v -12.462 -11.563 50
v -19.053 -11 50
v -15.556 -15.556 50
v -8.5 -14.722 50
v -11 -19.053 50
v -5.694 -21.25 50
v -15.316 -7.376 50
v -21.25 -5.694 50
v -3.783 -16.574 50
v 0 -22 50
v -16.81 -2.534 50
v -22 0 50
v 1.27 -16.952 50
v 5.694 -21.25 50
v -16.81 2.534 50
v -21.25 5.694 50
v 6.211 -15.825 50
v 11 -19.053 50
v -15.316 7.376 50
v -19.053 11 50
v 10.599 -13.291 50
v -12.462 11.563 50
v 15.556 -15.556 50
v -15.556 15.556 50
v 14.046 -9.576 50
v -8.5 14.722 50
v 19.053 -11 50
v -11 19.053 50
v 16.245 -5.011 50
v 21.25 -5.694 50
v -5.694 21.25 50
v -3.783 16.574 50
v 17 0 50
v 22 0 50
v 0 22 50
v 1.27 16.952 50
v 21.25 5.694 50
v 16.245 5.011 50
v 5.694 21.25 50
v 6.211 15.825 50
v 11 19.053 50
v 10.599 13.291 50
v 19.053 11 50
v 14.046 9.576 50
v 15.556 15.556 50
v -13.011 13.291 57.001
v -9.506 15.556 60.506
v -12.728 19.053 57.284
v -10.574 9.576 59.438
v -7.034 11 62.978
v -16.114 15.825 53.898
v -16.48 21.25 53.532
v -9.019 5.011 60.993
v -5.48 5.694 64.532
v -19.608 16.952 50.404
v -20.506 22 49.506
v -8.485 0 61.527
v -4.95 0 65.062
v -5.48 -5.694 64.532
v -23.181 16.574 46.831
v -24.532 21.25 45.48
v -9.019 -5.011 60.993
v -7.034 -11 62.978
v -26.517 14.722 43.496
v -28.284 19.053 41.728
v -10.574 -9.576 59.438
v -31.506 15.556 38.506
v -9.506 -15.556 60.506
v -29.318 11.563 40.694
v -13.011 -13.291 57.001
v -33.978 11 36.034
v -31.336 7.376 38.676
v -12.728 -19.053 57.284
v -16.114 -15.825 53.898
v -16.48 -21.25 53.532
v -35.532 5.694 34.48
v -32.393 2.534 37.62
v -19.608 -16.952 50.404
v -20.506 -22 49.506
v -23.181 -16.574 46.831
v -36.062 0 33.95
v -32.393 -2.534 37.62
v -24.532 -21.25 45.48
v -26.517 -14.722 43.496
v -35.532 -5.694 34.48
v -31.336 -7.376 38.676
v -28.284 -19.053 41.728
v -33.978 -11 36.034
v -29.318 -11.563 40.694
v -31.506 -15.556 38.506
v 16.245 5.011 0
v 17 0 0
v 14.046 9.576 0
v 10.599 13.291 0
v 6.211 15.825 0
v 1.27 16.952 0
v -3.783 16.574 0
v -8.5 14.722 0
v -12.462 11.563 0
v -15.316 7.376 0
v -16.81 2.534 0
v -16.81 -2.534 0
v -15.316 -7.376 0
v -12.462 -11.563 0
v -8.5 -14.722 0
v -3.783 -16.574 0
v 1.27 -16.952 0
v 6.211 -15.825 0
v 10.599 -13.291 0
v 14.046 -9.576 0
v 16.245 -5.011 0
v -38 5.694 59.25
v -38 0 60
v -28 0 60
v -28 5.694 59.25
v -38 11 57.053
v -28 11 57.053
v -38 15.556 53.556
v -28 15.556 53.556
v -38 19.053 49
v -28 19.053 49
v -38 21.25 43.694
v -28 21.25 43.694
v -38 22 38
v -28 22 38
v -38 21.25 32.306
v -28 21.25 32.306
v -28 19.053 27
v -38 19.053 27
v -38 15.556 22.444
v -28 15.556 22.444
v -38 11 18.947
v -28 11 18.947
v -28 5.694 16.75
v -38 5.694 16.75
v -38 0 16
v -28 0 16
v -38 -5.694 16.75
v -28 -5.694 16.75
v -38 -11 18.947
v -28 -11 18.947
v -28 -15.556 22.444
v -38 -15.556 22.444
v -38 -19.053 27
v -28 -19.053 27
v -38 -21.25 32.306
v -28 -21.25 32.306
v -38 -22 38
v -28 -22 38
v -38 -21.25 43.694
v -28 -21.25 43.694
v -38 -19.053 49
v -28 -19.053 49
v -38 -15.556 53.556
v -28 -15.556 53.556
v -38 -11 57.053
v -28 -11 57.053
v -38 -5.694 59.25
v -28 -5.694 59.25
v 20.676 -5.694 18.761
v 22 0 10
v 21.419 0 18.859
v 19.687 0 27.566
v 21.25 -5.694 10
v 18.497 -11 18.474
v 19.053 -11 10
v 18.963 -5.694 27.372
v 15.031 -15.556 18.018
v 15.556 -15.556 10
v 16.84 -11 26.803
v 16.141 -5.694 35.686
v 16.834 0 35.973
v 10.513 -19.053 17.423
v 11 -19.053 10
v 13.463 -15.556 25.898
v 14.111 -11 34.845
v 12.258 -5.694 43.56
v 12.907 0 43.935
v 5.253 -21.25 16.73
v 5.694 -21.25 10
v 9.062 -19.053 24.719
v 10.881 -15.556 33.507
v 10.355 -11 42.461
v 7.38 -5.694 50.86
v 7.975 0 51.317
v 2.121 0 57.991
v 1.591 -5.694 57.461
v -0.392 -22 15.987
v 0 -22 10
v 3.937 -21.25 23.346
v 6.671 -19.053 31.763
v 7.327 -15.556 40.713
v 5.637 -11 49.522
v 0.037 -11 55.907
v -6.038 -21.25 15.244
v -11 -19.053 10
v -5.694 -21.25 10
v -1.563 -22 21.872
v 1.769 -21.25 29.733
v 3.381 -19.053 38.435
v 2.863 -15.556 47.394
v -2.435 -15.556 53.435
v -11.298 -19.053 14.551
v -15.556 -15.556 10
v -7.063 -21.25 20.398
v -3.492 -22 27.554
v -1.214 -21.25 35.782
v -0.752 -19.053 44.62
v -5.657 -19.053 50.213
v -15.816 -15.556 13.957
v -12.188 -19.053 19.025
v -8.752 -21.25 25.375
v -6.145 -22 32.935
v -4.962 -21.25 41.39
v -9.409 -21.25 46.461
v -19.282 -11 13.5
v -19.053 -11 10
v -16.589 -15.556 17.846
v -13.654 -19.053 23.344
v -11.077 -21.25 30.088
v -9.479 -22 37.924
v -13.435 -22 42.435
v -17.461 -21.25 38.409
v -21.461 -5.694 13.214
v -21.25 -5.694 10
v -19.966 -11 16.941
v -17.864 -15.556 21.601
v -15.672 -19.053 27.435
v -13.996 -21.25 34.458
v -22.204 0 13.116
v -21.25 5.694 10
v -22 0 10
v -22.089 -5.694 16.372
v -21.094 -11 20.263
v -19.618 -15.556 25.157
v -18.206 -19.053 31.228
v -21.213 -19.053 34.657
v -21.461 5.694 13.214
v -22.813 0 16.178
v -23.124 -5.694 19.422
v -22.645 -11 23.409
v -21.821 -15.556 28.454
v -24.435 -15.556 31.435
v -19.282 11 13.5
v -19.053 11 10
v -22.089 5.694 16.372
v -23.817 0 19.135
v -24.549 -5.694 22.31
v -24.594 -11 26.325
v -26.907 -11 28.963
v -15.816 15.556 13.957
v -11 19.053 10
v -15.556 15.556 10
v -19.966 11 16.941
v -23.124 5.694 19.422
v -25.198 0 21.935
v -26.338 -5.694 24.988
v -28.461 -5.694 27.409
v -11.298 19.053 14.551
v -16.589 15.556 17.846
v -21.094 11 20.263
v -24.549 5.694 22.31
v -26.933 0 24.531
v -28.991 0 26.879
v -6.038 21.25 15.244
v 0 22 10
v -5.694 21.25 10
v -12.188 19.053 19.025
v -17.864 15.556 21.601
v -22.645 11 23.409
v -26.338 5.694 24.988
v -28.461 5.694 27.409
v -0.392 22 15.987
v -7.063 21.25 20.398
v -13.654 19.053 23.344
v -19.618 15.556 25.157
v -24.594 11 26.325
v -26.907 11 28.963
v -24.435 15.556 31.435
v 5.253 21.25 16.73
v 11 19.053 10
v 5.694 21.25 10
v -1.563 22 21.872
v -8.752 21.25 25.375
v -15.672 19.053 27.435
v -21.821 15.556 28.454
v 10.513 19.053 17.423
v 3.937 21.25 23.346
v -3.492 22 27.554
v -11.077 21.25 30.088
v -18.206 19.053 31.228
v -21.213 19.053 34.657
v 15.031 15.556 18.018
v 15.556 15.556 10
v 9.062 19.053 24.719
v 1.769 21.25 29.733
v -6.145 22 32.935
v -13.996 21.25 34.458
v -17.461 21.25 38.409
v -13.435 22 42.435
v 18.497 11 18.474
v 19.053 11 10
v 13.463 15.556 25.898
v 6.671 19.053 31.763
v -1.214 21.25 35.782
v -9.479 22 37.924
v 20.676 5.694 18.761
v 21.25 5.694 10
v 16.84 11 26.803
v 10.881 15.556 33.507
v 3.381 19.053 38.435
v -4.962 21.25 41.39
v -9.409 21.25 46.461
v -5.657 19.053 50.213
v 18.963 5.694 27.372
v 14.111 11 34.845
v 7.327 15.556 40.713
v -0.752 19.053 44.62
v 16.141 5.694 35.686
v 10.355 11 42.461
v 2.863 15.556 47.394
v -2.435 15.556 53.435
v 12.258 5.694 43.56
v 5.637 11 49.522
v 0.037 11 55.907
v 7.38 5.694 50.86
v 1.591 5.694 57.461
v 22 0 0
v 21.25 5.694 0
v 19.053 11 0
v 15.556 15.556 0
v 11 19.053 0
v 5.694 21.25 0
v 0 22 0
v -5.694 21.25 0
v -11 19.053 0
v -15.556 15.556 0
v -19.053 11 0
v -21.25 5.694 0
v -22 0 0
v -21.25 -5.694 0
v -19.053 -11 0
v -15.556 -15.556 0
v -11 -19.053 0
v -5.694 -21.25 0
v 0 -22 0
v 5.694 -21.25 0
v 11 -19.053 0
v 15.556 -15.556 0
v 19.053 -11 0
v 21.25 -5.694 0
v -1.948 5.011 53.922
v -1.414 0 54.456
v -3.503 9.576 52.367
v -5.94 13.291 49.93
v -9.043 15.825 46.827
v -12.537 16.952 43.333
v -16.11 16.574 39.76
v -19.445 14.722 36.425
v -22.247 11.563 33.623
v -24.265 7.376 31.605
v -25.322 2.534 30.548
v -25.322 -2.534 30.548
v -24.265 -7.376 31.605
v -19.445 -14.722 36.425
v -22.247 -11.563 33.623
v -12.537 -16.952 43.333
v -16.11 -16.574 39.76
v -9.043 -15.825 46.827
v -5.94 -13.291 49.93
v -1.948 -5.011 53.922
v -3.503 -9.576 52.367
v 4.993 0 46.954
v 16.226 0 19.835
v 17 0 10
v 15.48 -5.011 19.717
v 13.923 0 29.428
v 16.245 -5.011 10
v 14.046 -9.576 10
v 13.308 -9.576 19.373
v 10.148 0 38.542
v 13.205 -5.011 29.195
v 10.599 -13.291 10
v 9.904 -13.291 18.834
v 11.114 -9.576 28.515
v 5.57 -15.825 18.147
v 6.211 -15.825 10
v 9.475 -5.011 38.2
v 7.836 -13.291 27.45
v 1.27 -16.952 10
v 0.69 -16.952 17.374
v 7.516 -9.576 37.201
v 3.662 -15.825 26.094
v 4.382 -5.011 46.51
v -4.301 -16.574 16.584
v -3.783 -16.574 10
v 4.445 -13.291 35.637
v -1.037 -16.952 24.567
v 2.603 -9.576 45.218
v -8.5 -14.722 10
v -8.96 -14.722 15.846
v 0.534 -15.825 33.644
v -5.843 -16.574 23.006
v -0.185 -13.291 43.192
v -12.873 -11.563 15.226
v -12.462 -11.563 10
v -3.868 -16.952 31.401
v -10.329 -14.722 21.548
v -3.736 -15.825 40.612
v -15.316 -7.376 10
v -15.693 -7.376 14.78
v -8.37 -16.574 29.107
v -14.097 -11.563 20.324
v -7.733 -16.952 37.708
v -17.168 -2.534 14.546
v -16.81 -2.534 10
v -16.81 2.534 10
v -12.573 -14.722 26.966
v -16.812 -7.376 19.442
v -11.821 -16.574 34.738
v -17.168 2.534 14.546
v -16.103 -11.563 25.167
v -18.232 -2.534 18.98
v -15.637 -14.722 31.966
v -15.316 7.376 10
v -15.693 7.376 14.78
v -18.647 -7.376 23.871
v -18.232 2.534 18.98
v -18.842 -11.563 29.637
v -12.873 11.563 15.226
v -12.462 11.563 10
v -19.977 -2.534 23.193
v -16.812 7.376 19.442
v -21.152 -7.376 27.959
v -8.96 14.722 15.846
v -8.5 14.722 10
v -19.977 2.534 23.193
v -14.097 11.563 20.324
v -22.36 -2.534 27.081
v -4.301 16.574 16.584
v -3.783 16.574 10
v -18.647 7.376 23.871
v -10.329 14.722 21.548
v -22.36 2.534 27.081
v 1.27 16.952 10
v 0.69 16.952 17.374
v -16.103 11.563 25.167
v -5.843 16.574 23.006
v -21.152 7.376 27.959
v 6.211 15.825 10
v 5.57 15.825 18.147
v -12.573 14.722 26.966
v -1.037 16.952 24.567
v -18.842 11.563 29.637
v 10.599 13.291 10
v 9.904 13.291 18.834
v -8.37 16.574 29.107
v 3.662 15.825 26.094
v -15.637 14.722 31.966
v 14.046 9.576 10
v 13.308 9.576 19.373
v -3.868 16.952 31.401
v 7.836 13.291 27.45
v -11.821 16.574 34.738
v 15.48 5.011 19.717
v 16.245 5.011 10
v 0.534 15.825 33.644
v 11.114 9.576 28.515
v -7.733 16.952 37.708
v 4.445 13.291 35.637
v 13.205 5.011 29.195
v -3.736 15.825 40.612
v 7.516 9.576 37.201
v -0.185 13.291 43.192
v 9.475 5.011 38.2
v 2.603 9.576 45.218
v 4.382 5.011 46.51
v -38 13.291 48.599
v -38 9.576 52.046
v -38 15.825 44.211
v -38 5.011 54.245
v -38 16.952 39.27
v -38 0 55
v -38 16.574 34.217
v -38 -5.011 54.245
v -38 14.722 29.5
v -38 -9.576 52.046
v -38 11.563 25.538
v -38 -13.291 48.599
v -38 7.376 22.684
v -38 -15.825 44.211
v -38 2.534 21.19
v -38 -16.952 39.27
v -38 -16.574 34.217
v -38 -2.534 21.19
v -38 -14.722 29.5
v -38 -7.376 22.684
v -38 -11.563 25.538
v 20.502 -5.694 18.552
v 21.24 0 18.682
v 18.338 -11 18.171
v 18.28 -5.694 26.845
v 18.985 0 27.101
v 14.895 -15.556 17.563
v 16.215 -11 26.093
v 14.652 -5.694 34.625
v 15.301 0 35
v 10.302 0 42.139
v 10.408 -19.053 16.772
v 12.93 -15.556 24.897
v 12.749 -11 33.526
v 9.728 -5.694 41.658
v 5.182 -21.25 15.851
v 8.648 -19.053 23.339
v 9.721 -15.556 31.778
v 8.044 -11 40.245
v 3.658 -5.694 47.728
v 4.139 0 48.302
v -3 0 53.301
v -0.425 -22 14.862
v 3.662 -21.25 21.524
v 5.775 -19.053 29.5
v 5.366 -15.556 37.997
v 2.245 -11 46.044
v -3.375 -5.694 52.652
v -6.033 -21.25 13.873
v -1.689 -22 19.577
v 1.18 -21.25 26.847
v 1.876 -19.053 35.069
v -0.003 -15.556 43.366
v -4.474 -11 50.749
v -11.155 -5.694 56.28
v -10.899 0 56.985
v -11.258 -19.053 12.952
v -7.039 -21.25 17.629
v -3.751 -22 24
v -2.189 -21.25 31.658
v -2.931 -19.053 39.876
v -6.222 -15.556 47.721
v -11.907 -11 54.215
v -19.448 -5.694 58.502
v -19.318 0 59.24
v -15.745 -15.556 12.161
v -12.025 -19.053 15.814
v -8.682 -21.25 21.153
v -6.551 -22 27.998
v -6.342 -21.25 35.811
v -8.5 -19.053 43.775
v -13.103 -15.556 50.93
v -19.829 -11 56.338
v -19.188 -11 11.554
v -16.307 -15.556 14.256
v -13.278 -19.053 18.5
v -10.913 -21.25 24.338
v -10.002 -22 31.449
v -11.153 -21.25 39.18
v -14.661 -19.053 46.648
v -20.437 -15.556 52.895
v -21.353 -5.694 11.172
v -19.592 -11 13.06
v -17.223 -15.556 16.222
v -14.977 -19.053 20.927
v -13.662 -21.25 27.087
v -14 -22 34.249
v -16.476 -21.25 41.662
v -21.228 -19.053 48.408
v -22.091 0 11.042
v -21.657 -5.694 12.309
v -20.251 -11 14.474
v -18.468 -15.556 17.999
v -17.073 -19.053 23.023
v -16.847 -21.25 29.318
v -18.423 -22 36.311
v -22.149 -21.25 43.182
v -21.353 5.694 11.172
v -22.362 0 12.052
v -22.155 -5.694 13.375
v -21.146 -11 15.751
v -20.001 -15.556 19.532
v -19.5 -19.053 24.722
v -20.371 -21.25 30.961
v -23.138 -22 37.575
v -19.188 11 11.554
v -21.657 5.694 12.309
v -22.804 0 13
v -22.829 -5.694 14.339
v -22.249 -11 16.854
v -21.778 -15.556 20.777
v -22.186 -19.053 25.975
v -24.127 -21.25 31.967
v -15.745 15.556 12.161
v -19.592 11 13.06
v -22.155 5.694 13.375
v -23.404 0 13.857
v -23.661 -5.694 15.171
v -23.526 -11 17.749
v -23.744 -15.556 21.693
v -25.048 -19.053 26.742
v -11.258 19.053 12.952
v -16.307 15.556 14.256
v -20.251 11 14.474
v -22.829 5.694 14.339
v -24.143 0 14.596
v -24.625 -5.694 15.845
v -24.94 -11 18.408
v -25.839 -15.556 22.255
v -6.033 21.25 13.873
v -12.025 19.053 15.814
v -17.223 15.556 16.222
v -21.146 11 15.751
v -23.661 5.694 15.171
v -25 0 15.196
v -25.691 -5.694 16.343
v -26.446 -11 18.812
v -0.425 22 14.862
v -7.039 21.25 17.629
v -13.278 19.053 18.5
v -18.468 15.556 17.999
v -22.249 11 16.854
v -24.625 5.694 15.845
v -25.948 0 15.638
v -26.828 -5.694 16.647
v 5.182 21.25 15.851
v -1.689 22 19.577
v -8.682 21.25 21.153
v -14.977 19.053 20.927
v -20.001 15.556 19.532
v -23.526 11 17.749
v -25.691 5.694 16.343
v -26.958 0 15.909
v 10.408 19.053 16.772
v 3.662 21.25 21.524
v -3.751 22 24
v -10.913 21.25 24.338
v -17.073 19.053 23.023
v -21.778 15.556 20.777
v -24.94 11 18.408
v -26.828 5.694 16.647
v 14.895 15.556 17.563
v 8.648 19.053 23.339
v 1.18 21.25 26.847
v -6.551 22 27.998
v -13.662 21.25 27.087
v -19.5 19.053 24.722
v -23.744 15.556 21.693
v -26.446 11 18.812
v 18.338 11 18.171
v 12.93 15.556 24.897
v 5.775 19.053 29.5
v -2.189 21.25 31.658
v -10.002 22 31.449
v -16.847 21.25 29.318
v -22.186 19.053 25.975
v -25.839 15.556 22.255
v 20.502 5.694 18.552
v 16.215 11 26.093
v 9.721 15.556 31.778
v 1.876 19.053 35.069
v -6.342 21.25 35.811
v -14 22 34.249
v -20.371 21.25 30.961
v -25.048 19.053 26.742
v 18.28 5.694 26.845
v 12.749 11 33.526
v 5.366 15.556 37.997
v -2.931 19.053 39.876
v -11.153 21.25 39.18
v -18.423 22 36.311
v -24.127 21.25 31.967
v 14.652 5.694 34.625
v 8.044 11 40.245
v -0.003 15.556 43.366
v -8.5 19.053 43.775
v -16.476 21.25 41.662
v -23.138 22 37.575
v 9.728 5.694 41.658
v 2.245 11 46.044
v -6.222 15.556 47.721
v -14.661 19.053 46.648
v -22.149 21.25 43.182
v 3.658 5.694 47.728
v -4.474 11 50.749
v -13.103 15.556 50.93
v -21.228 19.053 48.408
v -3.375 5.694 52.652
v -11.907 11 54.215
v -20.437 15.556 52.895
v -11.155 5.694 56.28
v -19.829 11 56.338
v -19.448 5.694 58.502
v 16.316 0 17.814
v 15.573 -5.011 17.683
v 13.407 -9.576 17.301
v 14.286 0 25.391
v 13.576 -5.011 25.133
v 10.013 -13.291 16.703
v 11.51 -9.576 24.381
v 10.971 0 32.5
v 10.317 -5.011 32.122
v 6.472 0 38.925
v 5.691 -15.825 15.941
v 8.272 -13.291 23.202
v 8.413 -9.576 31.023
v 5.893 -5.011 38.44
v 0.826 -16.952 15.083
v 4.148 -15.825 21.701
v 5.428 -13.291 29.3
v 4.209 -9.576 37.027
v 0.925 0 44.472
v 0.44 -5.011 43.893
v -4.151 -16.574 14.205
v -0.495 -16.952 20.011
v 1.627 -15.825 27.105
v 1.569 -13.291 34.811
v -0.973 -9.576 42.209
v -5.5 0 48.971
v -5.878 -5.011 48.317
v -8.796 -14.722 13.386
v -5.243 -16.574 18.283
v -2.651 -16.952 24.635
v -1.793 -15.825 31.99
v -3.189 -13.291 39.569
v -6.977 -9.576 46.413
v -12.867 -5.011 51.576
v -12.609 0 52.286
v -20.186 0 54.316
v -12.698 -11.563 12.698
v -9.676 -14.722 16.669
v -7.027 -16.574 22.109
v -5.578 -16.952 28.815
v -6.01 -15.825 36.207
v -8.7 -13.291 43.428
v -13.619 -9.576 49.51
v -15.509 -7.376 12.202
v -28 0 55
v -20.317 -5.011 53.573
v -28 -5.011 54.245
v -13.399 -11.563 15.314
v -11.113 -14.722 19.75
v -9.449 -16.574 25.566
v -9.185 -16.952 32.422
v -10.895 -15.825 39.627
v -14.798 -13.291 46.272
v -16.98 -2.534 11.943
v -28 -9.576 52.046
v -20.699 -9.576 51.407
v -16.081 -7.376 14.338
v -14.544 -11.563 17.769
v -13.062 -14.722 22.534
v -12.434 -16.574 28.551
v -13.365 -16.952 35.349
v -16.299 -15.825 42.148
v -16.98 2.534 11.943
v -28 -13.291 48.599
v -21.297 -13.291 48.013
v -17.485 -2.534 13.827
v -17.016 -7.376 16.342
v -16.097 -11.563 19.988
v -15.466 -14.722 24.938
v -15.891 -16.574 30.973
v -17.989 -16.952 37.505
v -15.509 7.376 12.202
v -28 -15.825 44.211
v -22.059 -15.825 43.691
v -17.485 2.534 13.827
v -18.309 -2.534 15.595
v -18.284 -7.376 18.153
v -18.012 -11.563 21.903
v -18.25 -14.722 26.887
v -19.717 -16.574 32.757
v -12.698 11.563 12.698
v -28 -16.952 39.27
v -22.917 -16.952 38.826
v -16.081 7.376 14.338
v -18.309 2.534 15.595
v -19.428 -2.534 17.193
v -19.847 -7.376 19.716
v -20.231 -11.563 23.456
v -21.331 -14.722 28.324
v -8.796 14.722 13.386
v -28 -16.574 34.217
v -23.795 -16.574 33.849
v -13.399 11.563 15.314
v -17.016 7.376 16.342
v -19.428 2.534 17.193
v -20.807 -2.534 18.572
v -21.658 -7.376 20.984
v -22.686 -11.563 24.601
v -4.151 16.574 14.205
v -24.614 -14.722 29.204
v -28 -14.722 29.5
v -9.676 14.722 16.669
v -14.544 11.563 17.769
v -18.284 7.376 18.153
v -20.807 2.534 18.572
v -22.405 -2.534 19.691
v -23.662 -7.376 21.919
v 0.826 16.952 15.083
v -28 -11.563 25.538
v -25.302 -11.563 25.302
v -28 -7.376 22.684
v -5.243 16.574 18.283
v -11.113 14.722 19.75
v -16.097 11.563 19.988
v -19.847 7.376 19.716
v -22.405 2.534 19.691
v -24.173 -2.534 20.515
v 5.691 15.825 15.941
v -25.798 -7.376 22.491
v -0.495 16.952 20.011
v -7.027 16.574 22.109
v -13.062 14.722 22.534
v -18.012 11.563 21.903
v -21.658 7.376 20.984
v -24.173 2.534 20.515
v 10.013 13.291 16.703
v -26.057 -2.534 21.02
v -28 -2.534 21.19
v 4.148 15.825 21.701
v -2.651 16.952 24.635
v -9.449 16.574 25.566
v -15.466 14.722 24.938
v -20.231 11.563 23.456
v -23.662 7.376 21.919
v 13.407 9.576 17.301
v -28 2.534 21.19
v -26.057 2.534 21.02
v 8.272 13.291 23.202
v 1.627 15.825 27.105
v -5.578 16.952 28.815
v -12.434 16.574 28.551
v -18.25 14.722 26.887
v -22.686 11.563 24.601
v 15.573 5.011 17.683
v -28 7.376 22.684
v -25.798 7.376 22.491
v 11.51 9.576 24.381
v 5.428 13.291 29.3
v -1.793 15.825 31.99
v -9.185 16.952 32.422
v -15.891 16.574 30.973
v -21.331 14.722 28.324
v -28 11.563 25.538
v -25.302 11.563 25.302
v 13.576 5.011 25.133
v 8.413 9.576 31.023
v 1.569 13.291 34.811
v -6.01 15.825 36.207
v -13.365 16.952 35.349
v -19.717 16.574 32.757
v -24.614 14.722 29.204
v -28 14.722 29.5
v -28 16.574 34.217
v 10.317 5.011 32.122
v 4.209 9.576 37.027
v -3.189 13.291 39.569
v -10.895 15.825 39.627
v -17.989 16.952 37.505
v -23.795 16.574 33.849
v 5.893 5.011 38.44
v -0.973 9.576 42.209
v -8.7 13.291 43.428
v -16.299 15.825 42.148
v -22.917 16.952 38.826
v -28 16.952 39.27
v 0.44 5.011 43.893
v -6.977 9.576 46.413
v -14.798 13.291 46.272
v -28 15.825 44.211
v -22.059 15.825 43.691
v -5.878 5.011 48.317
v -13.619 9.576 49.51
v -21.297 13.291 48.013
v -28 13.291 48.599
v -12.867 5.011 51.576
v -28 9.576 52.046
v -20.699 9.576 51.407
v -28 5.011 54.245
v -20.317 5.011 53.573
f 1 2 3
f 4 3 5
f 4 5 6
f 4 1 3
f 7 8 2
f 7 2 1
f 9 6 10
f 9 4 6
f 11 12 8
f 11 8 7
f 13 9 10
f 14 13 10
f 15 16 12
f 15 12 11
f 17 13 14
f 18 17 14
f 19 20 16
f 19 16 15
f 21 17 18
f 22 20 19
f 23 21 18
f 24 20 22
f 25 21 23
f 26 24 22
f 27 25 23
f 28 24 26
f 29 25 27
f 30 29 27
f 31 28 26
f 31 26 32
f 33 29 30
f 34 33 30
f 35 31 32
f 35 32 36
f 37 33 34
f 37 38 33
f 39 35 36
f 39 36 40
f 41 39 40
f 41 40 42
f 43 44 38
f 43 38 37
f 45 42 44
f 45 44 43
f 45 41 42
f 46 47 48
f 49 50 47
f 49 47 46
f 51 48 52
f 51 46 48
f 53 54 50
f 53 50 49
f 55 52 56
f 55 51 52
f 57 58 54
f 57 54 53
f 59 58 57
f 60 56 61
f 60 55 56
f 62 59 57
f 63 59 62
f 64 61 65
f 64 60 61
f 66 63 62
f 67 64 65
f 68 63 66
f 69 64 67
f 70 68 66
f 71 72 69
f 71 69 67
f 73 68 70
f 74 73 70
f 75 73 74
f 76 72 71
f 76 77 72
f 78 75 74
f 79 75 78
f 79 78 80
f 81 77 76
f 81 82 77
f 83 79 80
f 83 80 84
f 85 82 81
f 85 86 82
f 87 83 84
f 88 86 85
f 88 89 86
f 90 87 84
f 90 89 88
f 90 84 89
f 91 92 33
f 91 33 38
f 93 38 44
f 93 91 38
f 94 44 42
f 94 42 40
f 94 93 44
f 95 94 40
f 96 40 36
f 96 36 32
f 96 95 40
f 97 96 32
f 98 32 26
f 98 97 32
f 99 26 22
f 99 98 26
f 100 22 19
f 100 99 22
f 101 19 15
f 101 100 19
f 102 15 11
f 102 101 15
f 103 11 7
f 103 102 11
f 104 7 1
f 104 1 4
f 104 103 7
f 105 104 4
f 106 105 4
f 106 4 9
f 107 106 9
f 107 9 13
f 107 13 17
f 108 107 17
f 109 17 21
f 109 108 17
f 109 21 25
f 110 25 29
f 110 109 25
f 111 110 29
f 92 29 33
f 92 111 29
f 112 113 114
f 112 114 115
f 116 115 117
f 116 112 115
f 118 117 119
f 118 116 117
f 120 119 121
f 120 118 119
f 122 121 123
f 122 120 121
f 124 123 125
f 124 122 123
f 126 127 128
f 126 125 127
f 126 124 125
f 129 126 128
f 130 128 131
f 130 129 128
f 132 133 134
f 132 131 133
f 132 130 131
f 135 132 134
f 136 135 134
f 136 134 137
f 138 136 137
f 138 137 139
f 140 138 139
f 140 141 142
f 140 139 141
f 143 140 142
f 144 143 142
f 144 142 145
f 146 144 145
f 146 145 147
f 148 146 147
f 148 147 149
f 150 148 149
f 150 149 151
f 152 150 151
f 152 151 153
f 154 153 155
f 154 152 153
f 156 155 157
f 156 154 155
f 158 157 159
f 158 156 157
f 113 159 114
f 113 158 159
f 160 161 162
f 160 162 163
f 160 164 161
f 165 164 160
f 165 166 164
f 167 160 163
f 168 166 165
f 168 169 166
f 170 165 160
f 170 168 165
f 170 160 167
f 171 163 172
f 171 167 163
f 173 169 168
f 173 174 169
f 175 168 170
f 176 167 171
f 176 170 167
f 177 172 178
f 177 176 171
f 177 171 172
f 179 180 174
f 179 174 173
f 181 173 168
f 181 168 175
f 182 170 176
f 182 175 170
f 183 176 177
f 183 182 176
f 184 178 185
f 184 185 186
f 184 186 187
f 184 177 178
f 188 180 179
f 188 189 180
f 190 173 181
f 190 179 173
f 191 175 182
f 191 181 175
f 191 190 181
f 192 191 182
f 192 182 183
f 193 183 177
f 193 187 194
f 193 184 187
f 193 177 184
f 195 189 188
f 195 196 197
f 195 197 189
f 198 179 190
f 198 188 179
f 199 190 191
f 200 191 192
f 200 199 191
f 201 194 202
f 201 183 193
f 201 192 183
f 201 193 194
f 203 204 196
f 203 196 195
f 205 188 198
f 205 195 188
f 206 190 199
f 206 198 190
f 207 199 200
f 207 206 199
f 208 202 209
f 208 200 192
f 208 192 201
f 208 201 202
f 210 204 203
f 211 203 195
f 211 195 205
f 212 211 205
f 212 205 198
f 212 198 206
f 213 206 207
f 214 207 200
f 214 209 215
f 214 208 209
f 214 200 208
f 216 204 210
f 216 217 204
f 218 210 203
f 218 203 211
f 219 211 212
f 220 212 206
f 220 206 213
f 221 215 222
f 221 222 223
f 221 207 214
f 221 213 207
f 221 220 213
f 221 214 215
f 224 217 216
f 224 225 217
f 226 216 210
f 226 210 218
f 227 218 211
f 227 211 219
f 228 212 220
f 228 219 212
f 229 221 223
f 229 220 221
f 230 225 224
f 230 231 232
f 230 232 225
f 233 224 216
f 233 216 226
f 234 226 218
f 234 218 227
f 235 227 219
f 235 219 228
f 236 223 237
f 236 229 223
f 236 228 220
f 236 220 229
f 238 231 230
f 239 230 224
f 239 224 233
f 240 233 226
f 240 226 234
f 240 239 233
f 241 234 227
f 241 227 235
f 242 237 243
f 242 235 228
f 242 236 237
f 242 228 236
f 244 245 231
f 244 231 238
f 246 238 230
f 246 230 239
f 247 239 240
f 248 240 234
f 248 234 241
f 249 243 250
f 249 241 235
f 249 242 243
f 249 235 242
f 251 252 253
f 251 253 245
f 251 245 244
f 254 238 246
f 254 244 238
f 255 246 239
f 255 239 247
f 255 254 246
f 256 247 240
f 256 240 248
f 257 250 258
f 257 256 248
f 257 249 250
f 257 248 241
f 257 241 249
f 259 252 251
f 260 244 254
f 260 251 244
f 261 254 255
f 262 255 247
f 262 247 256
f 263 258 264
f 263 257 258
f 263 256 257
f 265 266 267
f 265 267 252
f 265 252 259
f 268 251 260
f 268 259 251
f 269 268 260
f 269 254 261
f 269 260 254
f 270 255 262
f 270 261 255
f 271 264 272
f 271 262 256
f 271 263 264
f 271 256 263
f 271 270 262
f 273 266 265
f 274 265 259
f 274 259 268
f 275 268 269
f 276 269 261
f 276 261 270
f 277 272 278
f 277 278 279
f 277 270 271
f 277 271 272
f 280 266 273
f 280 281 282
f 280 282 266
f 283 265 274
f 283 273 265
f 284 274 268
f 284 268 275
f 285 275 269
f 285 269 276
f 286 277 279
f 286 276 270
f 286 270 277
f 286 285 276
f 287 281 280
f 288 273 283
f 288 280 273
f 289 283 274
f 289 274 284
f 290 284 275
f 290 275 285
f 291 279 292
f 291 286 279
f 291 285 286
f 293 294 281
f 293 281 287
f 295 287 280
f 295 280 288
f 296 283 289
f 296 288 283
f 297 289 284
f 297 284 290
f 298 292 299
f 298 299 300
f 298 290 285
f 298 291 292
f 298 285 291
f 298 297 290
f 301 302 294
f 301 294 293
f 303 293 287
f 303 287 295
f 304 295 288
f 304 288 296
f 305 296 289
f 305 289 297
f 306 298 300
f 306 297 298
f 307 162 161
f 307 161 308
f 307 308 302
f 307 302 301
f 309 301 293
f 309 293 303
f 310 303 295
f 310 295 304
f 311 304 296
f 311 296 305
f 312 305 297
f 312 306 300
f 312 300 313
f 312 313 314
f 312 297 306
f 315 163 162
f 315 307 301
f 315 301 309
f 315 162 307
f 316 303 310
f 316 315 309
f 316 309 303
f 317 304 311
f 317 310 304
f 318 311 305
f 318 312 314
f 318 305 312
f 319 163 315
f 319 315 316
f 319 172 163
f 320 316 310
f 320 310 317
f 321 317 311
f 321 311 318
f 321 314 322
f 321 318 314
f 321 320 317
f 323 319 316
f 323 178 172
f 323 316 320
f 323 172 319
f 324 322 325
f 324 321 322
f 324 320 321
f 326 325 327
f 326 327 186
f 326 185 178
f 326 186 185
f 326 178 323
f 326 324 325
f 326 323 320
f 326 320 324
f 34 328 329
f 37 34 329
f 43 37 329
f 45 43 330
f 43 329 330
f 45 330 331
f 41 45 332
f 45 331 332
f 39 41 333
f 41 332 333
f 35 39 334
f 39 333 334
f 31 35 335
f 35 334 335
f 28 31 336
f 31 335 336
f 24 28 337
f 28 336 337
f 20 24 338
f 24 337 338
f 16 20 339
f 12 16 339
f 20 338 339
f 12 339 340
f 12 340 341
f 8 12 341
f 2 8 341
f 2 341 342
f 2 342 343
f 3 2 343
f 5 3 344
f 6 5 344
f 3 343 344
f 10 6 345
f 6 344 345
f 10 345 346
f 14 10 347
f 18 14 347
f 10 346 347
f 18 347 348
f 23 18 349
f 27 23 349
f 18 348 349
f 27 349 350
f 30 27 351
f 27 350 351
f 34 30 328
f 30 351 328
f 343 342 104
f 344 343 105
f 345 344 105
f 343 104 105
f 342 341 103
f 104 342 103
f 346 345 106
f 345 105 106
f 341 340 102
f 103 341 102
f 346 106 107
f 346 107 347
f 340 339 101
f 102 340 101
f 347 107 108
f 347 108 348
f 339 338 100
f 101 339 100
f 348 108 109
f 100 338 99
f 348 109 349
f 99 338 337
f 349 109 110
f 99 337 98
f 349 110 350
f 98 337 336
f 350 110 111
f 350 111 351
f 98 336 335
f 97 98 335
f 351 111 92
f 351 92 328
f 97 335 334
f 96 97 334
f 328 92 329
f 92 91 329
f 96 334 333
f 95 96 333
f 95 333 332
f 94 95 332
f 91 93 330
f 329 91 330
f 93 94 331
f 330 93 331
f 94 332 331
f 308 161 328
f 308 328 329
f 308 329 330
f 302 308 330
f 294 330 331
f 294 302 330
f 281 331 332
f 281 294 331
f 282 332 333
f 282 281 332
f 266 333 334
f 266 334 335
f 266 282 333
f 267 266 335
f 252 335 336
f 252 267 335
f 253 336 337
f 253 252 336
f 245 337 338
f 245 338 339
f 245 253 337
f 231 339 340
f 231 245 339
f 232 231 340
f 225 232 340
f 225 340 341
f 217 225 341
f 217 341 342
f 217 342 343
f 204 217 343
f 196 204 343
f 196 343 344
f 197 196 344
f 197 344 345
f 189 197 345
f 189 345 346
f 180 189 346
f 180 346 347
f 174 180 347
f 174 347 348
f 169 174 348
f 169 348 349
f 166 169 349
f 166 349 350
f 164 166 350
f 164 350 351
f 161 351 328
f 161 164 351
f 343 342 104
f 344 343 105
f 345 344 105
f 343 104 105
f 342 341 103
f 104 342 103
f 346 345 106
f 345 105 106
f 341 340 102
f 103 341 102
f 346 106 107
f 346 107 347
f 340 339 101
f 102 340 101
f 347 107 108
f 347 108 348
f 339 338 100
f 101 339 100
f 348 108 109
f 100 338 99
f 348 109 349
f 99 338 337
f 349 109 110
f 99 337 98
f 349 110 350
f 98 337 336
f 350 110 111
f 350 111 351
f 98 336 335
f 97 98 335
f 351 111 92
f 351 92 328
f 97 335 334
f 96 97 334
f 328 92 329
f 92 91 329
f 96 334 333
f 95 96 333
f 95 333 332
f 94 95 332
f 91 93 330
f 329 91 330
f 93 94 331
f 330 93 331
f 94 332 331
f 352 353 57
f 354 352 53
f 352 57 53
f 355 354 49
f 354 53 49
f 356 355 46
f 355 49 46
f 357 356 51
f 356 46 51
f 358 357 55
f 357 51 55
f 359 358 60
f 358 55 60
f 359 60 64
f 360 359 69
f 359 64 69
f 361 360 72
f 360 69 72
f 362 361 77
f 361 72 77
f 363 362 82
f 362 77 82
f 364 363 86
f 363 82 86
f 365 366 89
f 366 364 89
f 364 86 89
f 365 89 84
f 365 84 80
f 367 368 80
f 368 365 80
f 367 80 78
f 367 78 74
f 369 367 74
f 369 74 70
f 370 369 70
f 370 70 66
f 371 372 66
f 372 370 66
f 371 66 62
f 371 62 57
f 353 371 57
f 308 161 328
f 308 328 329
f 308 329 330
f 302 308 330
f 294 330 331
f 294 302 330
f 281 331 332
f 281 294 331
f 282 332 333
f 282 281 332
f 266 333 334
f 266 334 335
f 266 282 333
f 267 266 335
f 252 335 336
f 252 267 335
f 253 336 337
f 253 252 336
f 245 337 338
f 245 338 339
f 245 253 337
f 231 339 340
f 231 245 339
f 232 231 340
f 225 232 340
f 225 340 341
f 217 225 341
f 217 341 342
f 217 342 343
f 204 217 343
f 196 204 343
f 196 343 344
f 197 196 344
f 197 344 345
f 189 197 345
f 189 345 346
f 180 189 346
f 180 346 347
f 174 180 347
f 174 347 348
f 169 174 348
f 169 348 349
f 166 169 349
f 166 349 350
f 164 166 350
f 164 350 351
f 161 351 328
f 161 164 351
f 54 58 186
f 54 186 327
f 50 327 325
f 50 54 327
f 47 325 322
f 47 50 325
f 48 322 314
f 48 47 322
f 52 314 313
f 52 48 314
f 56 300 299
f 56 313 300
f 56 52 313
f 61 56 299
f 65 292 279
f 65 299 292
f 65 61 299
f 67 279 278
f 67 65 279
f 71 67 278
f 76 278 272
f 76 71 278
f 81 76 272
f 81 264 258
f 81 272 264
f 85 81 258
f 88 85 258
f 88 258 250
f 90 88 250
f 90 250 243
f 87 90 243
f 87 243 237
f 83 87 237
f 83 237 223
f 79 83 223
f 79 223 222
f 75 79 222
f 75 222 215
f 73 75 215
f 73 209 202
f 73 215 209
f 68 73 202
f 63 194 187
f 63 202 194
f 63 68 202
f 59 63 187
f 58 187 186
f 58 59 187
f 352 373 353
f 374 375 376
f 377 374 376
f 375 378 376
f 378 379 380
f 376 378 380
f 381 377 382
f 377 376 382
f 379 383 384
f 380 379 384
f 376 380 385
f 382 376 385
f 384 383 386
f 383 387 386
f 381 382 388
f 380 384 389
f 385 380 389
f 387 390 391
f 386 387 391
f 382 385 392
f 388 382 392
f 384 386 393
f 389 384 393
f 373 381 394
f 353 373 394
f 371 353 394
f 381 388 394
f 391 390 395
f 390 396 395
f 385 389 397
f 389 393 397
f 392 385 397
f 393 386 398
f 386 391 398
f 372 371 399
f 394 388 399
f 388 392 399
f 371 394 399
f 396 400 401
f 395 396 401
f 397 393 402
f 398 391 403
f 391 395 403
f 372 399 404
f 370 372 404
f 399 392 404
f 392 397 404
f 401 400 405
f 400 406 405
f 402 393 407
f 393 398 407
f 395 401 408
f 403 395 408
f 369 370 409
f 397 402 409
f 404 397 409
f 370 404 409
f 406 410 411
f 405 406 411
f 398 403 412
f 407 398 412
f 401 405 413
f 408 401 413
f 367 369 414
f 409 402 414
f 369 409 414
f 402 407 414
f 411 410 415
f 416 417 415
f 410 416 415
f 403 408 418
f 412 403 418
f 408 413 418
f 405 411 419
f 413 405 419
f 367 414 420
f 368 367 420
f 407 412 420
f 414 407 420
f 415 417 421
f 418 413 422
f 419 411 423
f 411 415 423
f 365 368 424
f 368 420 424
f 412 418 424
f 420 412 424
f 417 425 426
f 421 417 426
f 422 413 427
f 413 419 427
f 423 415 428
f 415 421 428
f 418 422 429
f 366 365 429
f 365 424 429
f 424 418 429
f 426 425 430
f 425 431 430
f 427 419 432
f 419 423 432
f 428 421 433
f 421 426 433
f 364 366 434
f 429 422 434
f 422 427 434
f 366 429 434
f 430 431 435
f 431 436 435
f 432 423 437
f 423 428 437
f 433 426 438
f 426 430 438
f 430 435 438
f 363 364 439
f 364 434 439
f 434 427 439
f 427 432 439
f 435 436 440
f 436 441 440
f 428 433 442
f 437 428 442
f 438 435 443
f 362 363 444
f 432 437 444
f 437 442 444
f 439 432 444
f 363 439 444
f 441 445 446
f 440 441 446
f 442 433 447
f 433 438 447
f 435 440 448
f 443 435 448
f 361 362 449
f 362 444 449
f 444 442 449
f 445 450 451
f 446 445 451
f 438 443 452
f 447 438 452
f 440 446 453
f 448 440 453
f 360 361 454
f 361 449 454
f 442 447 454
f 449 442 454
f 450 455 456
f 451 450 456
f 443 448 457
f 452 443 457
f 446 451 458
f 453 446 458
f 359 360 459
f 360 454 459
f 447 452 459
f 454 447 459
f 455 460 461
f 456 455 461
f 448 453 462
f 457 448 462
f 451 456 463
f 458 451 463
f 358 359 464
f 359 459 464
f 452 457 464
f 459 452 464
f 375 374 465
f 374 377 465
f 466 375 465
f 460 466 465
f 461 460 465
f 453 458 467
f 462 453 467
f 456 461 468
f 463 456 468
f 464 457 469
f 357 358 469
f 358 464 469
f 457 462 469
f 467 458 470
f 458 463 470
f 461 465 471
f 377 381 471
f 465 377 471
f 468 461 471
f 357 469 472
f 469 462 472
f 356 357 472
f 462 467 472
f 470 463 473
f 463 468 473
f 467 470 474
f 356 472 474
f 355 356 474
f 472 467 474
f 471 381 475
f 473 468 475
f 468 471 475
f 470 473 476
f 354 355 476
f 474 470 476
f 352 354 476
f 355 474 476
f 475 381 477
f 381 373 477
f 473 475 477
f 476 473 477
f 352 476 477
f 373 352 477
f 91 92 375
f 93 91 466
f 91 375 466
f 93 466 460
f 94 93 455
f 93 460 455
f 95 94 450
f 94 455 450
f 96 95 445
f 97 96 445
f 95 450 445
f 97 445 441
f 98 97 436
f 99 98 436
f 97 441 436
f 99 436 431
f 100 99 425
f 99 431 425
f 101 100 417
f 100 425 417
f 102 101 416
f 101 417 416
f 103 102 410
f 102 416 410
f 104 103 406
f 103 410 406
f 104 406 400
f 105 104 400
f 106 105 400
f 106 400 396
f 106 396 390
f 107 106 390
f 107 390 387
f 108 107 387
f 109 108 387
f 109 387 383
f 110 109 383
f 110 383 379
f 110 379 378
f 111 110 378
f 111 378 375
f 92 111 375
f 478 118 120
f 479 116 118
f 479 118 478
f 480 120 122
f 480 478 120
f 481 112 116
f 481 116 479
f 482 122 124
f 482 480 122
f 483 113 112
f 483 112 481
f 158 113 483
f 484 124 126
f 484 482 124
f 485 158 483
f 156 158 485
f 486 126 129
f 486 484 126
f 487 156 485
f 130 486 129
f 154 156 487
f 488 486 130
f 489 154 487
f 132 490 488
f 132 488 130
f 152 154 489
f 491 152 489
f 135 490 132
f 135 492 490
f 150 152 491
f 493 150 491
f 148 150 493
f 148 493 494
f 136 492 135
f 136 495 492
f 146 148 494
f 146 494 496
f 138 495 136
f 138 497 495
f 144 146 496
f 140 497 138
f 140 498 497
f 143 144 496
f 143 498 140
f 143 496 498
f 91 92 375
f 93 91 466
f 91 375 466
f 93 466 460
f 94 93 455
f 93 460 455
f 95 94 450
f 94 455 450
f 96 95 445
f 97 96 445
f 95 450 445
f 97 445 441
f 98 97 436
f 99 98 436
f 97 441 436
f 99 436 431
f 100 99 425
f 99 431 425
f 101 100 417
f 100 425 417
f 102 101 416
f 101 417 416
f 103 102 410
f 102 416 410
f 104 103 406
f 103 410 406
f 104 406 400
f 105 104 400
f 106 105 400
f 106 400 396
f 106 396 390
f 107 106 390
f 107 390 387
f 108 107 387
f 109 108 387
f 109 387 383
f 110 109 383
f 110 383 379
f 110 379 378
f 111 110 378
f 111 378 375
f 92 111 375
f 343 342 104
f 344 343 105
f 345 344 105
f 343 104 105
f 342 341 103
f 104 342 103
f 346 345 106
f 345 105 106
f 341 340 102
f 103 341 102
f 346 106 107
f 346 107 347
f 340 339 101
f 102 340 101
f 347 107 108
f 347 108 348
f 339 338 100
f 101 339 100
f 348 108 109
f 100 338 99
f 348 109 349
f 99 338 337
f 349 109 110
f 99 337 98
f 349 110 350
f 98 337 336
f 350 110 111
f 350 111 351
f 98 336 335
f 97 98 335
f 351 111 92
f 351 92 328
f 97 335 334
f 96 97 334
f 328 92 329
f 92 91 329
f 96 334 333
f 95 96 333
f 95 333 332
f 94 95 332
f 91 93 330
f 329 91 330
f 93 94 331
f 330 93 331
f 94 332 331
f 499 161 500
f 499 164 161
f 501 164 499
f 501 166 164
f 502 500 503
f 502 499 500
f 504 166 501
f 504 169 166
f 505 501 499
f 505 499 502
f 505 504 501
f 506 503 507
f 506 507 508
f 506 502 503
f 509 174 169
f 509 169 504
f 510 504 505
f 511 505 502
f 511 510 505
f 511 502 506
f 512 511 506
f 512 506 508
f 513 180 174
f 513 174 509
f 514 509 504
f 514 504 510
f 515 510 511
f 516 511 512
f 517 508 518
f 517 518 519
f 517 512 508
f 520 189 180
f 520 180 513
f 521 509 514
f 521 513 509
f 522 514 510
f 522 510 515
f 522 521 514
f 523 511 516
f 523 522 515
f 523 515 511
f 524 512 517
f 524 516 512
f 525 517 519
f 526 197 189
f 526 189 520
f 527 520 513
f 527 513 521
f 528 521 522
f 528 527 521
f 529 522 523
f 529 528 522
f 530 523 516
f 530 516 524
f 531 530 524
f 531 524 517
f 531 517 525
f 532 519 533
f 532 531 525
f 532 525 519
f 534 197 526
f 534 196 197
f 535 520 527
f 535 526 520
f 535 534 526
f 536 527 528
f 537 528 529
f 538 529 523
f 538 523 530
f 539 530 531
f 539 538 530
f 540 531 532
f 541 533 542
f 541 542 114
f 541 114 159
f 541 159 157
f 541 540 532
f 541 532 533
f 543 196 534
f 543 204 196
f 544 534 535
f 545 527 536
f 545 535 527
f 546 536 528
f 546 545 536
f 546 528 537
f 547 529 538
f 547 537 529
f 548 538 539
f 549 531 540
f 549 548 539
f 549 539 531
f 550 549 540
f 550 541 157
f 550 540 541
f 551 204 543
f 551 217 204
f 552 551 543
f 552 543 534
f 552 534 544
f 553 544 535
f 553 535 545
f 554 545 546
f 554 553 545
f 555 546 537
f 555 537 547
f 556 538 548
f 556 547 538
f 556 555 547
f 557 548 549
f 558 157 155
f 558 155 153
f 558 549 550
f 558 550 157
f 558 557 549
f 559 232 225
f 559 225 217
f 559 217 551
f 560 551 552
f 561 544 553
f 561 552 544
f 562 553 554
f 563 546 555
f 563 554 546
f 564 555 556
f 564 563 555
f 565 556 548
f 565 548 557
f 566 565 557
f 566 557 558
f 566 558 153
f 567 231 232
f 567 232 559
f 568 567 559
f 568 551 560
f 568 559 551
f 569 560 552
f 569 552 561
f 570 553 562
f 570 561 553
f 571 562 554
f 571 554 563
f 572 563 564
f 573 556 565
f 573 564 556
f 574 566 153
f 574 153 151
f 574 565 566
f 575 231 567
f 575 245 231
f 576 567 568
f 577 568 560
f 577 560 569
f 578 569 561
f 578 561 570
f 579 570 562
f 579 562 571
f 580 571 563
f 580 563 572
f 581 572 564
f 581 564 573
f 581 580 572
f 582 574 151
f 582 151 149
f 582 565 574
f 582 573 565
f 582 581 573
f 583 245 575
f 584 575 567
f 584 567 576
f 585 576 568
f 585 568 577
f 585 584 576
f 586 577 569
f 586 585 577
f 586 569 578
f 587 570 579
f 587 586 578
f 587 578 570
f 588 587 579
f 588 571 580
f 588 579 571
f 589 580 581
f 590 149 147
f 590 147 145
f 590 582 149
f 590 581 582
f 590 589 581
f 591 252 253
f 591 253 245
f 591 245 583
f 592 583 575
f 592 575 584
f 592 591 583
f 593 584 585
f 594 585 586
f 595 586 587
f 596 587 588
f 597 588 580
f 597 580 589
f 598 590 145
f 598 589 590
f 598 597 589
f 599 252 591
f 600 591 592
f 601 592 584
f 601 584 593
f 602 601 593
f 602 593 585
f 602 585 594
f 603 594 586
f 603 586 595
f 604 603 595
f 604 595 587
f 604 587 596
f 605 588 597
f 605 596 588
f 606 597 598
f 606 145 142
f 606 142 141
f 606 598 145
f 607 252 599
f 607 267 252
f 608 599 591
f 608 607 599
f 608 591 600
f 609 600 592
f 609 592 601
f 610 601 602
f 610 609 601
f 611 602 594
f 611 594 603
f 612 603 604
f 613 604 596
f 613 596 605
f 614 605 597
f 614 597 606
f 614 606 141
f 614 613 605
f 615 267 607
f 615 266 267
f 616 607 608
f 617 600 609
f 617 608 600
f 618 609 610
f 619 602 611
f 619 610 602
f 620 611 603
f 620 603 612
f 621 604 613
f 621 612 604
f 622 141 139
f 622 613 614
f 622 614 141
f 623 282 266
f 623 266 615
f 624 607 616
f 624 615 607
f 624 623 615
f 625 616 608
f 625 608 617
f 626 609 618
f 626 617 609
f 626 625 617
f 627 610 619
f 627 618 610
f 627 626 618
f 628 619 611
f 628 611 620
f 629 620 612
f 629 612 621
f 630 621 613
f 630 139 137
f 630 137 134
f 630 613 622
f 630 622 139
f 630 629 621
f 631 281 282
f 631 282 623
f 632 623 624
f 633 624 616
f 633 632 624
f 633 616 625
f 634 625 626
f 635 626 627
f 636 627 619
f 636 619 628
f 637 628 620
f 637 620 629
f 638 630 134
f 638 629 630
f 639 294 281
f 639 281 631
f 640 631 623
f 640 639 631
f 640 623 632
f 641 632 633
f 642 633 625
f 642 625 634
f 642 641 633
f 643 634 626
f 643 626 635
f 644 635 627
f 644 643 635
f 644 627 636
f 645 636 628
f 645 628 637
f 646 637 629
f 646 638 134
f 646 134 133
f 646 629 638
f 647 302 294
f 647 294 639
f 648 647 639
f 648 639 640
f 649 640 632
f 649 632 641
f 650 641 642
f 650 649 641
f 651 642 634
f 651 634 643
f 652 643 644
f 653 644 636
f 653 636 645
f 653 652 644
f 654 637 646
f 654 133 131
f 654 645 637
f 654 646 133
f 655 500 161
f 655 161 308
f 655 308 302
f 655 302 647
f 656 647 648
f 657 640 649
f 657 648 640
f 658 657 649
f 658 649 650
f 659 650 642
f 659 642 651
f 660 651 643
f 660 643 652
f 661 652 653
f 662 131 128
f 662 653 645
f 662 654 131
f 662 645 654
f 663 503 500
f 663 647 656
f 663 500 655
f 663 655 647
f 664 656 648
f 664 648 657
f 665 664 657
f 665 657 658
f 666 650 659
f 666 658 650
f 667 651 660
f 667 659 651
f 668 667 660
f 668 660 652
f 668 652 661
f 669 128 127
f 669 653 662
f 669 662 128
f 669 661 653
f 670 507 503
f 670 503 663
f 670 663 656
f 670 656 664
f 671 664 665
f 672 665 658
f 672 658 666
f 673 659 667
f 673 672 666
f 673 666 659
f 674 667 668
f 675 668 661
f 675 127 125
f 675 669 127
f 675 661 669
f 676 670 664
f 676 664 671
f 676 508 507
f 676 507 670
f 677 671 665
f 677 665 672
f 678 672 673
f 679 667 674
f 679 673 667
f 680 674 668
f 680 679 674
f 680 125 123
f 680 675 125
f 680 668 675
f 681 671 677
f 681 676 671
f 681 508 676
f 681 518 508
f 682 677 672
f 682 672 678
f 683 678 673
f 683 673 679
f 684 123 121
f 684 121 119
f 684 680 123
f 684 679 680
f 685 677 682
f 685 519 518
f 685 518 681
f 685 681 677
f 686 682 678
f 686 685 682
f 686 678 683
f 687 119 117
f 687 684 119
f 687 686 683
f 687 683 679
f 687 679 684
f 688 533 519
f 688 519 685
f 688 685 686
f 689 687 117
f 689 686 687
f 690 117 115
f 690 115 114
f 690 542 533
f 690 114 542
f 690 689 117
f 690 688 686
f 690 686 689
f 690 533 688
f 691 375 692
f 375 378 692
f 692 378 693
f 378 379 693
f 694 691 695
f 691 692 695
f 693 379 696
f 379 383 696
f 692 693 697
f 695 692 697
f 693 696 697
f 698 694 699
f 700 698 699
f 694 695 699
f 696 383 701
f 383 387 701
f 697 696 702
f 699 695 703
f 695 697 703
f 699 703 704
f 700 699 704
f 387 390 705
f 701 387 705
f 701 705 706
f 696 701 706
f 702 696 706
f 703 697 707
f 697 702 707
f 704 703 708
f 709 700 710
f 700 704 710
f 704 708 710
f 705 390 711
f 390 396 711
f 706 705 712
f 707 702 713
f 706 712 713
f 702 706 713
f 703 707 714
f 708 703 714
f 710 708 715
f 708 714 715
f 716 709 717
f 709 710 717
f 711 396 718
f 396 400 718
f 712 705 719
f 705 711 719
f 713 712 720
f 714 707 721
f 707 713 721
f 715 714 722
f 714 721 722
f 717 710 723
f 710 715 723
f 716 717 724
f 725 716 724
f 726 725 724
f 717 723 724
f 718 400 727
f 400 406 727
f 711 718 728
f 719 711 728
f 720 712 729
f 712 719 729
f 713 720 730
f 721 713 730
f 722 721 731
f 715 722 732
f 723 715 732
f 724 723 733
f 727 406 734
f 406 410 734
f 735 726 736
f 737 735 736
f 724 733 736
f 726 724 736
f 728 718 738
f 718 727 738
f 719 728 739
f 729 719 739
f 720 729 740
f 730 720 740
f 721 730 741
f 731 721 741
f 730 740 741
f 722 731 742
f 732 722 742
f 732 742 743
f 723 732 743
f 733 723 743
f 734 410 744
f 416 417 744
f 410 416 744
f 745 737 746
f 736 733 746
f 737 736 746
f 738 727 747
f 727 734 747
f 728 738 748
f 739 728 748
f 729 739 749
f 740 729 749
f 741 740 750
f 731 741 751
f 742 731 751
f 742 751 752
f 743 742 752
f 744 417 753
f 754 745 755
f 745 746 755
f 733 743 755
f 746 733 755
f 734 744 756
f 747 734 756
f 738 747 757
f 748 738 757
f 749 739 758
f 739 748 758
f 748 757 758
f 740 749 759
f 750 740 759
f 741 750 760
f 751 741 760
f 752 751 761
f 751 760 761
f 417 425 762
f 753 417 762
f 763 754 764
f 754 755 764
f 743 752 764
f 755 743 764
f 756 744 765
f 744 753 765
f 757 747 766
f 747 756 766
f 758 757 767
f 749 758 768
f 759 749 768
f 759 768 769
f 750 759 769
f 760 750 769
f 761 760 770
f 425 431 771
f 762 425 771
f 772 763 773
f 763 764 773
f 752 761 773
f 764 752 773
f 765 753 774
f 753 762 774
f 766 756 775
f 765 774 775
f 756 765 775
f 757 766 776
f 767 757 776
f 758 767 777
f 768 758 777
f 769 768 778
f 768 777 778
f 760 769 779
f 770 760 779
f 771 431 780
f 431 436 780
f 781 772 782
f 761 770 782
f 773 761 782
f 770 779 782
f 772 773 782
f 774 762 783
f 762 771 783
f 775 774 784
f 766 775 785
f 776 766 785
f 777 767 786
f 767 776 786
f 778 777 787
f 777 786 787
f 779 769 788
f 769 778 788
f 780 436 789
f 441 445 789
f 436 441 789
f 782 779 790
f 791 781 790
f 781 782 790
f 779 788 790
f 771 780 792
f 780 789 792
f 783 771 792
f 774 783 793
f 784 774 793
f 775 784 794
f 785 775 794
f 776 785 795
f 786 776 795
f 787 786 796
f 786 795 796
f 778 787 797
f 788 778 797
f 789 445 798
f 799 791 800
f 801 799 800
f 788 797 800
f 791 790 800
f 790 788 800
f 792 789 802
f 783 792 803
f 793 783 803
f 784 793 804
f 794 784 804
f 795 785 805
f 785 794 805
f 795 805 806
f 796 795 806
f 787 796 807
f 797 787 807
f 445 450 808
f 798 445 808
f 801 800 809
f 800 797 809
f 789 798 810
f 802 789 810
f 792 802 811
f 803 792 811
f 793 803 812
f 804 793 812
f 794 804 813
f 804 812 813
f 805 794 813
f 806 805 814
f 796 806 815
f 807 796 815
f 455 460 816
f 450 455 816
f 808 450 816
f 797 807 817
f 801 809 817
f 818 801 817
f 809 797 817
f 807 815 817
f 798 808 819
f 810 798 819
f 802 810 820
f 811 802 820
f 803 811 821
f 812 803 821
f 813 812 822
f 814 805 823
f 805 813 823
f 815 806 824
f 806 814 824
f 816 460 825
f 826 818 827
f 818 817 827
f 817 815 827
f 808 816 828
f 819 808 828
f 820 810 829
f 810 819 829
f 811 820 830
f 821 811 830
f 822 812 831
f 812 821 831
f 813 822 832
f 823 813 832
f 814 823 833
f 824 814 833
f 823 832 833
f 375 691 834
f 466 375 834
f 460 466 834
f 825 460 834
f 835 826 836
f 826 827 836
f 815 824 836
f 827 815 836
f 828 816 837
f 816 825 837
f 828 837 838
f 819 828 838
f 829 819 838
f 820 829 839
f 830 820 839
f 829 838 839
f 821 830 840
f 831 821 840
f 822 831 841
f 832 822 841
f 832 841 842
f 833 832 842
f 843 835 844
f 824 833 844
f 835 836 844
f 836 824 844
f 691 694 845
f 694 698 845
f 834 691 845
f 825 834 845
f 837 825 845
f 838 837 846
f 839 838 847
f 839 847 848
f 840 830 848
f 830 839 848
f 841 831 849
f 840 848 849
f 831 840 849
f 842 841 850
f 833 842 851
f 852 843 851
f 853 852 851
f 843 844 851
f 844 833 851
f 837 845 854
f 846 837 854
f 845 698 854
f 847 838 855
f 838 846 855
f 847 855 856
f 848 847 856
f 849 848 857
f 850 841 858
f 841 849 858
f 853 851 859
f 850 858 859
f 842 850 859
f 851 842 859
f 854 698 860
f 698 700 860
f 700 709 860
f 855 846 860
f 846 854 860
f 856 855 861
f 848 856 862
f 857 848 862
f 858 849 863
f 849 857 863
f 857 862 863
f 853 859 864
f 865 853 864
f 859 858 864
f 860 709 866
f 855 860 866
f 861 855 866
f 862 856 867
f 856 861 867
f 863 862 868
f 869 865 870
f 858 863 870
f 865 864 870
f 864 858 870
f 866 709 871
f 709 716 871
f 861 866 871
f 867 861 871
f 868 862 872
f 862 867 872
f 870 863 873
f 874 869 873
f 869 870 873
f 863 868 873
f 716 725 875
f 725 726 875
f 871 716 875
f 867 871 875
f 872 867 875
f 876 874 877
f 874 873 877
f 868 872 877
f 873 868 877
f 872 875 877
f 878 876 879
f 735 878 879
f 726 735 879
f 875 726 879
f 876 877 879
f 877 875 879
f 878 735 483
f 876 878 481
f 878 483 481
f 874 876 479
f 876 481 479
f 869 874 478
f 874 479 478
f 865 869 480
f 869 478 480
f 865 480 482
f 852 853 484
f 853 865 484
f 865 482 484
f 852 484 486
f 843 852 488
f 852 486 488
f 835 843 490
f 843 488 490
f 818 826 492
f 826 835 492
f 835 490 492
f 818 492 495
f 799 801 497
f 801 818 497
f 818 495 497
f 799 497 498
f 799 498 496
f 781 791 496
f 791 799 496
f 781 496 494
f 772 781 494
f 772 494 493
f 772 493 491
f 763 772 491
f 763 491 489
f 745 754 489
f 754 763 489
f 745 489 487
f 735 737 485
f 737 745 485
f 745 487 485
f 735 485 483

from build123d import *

# Parameters (mm, degrees)
F1_R     = 22
F1_R_2   = 17
F5_DEPTH = 50


with BuildPart() as f2:
    # F2: sweep along a path in F0
    with BuildLine(Plane.XZ) as f2_path:
        Line((0, 0), (0, 10))
        ThreePointArc((0, 10), (-8.2010101268, 29.7989898732), (-28, 38))
        Line((-28, 38), (-38, 38))
    # F1 (on Top) → F2 (sweep)
    with BuildSketch(Plane.XY):
        Circle(F1_R)
        Circle(F1_R_2, mode=Mode.SUBTRACT)
    sweep(path=f2_path.line)


with BuildPart() as f4:
    # F4: sweep along a path in F3
    with BuildLine(Plane.XZ) as f4_path:
        Line((0, 0), (0, 10))
        ThreePointArc((0, 10), (-3.4916502347, 27.5537111177), (-13.4350288425, 42.4350288425))
        Line((-13.4350288425, 42.4350288425), (-20.5060966544, 49.5060966544))
    # F1 (on Top) → F4 (sweep)
    with BuildSketch(Plane.XY):
        Circle(F1_R)
        Circle(F1_R_2, mode=Mode.SUBTRACT)
    sweep(path=f4_path.line)


with BuildPart() as f5:
    # F1 (on Top) → F5 (new body)
    with BuildSketch(Plane.XY):
        Circle(F1_R)
        Circle(F1_R_2, mode=Mode.SUBTRACT)
    extrude(amount=F5_DEPTH)


solid = Compound([f2.part, f4.part, f5.part])
